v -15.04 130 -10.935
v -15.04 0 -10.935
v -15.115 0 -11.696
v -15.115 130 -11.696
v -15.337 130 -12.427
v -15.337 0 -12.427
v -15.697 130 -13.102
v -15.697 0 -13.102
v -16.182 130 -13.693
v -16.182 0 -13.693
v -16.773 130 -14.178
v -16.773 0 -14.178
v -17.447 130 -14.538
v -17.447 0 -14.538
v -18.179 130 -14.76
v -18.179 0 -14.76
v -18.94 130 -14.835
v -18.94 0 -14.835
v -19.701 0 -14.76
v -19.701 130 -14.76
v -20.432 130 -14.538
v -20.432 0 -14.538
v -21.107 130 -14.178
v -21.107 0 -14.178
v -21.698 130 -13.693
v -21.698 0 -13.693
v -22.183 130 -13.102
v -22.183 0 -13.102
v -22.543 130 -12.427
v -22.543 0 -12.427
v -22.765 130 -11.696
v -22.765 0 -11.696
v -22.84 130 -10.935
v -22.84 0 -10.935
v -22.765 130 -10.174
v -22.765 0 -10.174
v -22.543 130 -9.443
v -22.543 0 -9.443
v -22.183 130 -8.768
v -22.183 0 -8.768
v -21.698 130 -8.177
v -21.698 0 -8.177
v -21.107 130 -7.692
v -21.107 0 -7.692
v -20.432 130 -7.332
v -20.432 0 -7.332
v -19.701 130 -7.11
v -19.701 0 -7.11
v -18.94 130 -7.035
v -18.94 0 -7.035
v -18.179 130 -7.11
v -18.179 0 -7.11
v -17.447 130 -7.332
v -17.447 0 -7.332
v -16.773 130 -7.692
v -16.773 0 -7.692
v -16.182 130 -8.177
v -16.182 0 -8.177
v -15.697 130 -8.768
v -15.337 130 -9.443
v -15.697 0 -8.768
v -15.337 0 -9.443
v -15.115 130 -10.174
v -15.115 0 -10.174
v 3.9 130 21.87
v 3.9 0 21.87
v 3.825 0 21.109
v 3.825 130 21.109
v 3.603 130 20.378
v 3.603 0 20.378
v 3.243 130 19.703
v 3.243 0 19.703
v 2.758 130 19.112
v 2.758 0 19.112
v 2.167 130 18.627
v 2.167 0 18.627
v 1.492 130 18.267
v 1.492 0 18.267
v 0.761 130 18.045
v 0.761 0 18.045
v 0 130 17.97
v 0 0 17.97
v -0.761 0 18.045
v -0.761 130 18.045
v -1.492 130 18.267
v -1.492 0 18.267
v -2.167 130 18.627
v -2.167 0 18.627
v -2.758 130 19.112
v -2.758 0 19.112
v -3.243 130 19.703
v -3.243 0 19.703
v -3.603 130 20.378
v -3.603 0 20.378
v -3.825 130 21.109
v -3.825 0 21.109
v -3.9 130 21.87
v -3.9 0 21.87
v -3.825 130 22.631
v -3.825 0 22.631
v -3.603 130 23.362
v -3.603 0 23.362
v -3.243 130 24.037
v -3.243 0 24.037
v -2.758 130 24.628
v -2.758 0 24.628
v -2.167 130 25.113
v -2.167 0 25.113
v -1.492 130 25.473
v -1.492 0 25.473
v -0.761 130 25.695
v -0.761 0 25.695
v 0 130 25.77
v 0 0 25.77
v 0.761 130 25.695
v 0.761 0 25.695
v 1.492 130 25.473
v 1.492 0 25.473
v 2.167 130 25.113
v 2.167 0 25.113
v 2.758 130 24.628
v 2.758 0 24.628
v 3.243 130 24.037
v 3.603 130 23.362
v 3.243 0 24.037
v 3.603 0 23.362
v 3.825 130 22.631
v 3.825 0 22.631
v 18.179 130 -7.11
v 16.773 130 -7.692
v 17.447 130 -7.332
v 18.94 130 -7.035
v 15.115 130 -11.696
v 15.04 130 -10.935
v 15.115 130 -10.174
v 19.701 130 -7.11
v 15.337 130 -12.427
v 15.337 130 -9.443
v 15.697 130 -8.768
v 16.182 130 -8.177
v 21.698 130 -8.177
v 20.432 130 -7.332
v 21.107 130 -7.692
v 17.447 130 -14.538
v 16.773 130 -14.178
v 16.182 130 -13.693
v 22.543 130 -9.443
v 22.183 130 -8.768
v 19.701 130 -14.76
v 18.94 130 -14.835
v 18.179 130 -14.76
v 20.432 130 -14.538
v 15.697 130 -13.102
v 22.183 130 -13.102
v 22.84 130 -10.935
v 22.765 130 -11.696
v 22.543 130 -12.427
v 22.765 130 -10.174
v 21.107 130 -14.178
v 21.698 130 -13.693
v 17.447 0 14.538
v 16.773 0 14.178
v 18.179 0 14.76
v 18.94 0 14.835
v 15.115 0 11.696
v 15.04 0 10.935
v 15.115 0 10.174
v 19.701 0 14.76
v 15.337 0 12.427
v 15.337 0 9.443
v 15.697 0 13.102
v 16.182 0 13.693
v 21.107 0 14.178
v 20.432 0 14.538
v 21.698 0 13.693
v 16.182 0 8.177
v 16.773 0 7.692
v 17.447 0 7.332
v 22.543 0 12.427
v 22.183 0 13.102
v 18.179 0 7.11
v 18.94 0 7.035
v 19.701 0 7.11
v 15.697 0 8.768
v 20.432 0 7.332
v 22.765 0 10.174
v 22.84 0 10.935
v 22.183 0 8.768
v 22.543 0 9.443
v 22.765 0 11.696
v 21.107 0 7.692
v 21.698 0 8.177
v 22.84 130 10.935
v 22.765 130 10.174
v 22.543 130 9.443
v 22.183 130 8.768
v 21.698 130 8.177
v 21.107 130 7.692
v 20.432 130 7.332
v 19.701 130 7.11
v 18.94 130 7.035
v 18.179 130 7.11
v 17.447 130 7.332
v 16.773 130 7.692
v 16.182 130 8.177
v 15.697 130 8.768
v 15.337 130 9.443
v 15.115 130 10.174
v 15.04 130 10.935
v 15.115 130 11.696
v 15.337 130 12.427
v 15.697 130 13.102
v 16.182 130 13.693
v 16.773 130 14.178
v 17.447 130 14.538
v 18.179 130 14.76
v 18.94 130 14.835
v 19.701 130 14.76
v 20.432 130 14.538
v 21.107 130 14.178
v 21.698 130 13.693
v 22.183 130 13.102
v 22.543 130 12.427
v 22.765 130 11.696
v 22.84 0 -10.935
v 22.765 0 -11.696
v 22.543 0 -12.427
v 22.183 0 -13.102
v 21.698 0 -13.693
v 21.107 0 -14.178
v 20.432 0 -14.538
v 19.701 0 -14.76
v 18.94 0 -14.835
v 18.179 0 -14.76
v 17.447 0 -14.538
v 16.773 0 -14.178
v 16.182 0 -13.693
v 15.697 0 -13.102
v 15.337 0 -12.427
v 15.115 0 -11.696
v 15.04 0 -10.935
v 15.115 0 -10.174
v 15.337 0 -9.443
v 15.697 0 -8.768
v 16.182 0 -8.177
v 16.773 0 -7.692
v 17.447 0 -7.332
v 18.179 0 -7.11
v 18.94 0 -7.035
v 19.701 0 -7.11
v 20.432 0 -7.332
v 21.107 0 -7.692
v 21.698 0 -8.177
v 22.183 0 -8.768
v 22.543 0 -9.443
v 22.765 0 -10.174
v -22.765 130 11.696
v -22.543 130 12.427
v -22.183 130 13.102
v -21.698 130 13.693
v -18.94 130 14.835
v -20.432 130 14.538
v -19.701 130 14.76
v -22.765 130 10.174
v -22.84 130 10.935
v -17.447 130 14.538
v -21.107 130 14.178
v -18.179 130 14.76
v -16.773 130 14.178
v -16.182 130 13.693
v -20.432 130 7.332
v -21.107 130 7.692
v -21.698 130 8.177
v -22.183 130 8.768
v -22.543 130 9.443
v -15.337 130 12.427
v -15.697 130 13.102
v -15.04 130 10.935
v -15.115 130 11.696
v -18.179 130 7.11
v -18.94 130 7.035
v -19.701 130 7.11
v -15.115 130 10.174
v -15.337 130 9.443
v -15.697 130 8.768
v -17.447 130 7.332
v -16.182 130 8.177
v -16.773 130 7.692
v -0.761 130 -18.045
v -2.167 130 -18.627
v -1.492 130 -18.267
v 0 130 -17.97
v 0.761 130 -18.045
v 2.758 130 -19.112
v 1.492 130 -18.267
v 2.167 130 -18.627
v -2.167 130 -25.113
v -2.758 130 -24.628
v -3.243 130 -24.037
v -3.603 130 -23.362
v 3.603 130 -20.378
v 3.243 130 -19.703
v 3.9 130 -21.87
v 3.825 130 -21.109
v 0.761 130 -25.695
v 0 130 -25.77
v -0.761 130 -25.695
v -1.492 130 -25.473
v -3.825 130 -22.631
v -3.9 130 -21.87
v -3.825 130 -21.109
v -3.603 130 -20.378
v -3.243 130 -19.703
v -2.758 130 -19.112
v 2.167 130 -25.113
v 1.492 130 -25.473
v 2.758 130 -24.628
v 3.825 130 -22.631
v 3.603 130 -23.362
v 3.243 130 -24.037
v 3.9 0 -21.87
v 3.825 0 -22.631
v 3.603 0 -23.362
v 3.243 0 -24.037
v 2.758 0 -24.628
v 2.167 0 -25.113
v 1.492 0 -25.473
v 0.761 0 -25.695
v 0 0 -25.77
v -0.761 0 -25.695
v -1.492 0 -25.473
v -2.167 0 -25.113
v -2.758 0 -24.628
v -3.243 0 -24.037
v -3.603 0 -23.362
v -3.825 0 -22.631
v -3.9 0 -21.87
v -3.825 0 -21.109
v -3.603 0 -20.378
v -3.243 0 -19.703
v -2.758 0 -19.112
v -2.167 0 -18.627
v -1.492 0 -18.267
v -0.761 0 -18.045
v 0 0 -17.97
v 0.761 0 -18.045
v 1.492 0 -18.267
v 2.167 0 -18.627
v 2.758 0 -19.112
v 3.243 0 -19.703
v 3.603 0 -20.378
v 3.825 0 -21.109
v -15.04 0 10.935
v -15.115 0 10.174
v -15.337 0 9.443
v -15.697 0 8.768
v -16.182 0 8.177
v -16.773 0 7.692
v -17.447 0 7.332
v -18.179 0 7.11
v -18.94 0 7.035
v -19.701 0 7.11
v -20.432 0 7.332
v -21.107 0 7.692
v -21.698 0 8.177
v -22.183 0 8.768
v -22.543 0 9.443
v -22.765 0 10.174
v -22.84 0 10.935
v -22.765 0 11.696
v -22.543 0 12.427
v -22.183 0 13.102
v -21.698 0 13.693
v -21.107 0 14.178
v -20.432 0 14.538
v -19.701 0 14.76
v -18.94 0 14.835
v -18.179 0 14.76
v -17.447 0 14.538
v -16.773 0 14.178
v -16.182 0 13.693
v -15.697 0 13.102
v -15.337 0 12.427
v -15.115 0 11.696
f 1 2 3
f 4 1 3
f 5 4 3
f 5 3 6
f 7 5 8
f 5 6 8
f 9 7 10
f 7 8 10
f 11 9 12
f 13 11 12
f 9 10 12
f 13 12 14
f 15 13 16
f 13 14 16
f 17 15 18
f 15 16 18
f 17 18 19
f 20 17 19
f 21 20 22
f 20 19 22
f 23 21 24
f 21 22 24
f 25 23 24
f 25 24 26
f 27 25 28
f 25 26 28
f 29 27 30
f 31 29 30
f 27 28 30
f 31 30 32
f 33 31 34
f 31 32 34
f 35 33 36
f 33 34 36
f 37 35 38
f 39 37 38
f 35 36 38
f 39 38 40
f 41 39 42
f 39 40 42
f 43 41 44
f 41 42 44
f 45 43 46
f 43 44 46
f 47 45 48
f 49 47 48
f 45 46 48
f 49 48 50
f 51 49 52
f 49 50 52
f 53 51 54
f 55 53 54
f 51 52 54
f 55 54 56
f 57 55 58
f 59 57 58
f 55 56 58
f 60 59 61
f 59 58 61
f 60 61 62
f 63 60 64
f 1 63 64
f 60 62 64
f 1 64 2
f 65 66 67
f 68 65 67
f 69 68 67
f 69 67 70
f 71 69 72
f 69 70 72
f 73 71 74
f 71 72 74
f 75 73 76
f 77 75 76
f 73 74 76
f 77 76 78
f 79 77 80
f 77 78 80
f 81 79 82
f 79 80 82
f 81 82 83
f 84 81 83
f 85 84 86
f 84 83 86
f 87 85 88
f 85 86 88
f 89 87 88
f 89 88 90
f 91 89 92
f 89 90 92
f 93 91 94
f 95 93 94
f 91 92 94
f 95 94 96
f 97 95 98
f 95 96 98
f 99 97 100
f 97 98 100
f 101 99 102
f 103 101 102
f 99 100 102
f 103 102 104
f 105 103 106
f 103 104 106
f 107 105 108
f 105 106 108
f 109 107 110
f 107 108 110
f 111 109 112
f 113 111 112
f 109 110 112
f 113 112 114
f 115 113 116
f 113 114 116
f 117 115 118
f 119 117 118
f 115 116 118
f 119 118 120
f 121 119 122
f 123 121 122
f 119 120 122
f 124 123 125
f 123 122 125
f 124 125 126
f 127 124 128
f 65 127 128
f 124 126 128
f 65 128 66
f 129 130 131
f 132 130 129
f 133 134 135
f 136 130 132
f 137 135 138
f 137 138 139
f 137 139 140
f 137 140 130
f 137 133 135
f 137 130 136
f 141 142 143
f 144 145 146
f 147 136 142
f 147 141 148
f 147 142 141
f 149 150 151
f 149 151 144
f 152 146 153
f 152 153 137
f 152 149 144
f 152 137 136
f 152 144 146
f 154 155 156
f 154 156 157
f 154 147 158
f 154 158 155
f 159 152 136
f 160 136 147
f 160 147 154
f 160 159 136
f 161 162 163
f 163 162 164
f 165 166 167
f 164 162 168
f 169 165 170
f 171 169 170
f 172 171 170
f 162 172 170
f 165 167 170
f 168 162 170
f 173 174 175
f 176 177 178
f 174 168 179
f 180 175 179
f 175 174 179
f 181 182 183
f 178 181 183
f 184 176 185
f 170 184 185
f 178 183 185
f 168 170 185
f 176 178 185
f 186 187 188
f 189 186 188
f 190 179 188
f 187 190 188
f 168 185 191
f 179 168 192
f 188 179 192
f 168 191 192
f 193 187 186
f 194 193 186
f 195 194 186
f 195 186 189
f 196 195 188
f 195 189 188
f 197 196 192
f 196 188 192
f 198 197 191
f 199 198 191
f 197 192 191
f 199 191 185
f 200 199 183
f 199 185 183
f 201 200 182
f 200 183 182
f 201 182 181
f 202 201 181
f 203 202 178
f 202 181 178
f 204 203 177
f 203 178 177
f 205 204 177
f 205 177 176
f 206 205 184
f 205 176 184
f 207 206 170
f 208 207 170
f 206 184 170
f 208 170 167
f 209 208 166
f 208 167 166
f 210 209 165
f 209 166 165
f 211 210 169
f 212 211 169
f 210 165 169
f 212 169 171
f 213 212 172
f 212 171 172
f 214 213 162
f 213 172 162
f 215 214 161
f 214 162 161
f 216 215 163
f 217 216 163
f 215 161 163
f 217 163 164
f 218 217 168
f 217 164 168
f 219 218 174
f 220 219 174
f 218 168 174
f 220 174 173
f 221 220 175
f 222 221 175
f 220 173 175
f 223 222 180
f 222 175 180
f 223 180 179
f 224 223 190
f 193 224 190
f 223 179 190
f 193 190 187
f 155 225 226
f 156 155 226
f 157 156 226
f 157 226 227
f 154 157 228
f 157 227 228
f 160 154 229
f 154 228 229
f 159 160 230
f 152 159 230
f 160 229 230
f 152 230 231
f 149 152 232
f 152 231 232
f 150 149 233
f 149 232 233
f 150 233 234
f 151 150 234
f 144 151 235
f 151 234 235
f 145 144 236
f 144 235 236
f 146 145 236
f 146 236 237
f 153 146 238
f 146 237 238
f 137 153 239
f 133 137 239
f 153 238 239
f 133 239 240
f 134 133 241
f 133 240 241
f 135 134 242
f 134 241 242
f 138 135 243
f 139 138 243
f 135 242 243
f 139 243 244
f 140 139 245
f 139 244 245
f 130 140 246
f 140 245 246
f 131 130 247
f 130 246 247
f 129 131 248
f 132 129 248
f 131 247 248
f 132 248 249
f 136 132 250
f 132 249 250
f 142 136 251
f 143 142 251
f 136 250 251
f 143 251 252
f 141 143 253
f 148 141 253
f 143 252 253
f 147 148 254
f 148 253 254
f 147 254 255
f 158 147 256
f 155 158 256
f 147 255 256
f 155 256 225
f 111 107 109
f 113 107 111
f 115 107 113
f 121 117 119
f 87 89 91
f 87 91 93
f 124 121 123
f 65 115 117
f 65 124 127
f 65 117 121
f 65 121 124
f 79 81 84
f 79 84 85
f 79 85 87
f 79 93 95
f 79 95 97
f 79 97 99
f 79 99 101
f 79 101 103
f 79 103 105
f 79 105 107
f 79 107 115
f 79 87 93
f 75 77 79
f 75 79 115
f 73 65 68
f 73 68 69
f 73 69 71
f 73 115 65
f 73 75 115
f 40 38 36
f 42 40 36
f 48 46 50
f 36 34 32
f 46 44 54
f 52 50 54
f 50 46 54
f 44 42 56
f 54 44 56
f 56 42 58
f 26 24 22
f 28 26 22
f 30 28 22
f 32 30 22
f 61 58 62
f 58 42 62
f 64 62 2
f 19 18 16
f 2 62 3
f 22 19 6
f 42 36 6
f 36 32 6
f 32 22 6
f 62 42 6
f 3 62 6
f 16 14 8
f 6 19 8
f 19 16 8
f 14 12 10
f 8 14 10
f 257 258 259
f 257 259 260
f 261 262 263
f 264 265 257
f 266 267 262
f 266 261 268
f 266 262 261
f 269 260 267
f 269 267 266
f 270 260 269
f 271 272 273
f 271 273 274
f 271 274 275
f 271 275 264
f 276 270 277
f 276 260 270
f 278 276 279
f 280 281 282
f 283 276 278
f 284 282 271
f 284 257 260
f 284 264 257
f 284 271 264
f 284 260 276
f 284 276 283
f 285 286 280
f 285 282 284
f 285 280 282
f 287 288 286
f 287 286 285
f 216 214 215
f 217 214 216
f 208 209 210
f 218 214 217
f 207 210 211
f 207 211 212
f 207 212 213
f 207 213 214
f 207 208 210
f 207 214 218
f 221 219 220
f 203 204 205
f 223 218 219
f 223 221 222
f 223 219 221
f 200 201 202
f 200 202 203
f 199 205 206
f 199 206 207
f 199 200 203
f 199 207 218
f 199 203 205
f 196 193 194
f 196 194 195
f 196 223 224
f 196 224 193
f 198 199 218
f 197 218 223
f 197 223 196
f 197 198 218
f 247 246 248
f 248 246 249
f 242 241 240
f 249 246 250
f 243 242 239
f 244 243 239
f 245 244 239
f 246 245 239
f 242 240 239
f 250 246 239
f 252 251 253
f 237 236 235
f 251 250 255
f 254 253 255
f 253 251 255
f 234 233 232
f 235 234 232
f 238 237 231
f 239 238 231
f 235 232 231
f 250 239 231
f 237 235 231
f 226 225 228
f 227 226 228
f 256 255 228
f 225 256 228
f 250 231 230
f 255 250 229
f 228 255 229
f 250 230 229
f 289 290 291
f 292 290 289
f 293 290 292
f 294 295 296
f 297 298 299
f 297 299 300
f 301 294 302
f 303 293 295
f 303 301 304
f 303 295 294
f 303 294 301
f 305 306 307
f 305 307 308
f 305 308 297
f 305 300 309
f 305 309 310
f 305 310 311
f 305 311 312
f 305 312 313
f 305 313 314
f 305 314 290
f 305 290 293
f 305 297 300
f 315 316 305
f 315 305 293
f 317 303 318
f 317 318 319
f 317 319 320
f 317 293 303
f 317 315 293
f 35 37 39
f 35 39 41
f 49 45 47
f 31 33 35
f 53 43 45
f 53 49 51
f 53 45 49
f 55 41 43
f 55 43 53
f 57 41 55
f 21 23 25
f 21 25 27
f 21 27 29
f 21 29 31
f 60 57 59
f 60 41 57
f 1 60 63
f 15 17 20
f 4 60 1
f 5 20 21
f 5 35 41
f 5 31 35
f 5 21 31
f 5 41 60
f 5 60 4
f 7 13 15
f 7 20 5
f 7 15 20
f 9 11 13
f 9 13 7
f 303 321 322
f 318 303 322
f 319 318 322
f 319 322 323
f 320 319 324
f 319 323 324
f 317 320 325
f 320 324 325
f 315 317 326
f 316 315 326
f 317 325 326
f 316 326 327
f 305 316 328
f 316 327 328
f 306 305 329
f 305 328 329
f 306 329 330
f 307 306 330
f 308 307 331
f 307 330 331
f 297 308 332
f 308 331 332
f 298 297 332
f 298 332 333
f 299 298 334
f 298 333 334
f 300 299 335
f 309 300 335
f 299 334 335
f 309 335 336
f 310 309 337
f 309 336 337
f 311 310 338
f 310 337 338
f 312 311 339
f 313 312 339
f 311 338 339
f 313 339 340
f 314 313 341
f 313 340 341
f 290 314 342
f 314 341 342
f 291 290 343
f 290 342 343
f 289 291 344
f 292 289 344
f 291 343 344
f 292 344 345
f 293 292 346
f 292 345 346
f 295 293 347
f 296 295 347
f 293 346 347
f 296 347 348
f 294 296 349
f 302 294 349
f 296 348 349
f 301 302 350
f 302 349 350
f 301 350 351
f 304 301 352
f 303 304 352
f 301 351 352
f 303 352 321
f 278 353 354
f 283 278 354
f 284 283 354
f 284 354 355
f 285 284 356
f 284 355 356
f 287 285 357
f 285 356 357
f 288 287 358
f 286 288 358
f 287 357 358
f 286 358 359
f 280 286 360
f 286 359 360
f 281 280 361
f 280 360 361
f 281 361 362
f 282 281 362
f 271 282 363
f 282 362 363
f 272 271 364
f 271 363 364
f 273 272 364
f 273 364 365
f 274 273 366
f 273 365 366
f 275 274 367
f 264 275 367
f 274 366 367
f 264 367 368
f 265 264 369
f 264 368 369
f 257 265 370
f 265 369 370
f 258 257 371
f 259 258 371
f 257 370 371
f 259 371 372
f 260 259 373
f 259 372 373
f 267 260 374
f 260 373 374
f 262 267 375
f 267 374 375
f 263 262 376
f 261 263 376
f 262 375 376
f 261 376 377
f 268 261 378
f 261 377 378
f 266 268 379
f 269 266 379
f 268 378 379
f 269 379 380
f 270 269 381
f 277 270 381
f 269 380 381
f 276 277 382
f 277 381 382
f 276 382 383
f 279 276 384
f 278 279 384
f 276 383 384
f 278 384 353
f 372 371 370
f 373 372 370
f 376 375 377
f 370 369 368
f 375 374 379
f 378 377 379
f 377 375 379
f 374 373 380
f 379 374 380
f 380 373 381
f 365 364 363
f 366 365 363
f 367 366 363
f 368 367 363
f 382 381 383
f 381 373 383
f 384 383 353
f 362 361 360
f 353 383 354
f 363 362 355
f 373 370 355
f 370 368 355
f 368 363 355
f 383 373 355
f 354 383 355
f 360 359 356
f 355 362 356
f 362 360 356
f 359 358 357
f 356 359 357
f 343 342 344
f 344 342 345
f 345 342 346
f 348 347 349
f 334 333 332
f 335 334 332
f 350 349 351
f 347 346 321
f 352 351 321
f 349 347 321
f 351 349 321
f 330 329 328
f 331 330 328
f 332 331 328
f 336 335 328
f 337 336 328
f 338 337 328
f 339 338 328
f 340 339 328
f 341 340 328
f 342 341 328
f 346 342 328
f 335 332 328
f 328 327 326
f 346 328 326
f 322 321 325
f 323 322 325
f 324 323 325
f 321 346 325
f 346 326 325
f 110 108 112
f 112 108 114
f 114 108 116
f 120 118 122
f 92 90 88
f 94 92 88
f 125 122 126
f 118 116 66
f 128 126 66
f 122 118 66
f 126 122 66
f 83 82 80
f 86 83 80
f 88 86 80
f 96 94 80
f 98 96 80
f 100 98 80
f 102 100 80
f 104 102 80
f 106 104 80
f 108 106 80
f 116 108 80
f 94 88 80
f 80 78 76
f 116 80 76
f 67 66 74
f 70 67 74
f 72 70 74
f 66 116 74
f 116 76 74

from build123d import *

# Parameters (mm, degrees)
SKETCH1_R             = 3.9
BOSS_EXTRUDE1_DEPTH   = 130
BOSS_EXTRUDE1_2_DEPTH = 130
BOSS_EXTRUDE1_3_DEPTH = 130
BOSS_EXTRUDE1_4_DEPTH = 130
BOSS_EXTRUDE1_5_DEPTH = 130
BOSS_EXTRUDE1_6_DEPTH = 130


with BuildPart() as part:
    # Sketch1 → Boss-Extrude1 (new body)
    with BuildSketch(Plane(origin=(0, 0, 0), x_dir=(1, 0, 0), z_dir=(0, 1, 0))):
        with Locations((0, -21.869969165)):
            Circle(SKETCH1_R)
    extrude(amount=BOSS_EXTRUDE1_DEPTH)


with BuildPart() as body_2:
    # Sketch1 → Boss-Extrude1 2 (new body)
    with BuildSketch(Plane(origin=(0, 0, 0), x_dir=(1, 0, 0), z_dir=(0, 1, 0))):
        with Locations((-18.939948877, -10.934984583)):
            Circle(SKETCH1_R)
    extrude(amount=BOSS_EXTRUDE1_2_DEPTH)


with BuildPart() as body_3:
    # Sketch1 → Boss-Extrude1 3 (new body)
    with BuildSketch(Plane(origin=(0, 0, 0), x_dir=(1, 0, 0), z_dir=(0, 1, 0))):
        with Locations((-18.939948877, 10.934984583)):
            Circle(SKETCH1_R)
    extrude(amount=BOSS_EXTRUDE1_3_DEPTH)


with BuildPart() as body_4:
    # Sketch1 → Boss-Extrude1 4 (new body)
    with BuildSketch(Plane(origin=(0, 0, 0), x_dir=(1, 0, 0), z_dir=(0, 1, 0))):
        with Locations((0, 21.869969165)):
            Circle(SKETCH1_R)
    extrude(amount=BOSS_EXTRUDE1_4_DEPTH)


with BuildPart() as body_5:
    # Sketch1 → Boss-Extrude1 5 (new body)
    with BuildSketch(Plane(origin=(0, 0, 0), x_dir=(1, 0, 0), z_dir=(0, 1, 0))):
        with Locations((18.939948877, 10.934984583)):
            Circle(SKETCH1_R)
    extrude(amount=BOSS_EXTRUDE1_5_DEPTH)


with BuildPart() as body_6:
    # Sketch1 → Boss-Extrude1 6 (new body)
    with BuildSketch(Plane(origin=(0, 0, 0), x_dir=(1, 0, 0), z_dir=(0, 1, 0))):
        with Locations((18.939948877, -10.934984583)):
            Circle(SKETCH1_R)
    extrude(amount=BOSS_EXTRUDE1_6_DEPTH)


solid = Compound([part.part, body_2.part, body_3.part, body_4.part, body_5.part, body_6.part])
